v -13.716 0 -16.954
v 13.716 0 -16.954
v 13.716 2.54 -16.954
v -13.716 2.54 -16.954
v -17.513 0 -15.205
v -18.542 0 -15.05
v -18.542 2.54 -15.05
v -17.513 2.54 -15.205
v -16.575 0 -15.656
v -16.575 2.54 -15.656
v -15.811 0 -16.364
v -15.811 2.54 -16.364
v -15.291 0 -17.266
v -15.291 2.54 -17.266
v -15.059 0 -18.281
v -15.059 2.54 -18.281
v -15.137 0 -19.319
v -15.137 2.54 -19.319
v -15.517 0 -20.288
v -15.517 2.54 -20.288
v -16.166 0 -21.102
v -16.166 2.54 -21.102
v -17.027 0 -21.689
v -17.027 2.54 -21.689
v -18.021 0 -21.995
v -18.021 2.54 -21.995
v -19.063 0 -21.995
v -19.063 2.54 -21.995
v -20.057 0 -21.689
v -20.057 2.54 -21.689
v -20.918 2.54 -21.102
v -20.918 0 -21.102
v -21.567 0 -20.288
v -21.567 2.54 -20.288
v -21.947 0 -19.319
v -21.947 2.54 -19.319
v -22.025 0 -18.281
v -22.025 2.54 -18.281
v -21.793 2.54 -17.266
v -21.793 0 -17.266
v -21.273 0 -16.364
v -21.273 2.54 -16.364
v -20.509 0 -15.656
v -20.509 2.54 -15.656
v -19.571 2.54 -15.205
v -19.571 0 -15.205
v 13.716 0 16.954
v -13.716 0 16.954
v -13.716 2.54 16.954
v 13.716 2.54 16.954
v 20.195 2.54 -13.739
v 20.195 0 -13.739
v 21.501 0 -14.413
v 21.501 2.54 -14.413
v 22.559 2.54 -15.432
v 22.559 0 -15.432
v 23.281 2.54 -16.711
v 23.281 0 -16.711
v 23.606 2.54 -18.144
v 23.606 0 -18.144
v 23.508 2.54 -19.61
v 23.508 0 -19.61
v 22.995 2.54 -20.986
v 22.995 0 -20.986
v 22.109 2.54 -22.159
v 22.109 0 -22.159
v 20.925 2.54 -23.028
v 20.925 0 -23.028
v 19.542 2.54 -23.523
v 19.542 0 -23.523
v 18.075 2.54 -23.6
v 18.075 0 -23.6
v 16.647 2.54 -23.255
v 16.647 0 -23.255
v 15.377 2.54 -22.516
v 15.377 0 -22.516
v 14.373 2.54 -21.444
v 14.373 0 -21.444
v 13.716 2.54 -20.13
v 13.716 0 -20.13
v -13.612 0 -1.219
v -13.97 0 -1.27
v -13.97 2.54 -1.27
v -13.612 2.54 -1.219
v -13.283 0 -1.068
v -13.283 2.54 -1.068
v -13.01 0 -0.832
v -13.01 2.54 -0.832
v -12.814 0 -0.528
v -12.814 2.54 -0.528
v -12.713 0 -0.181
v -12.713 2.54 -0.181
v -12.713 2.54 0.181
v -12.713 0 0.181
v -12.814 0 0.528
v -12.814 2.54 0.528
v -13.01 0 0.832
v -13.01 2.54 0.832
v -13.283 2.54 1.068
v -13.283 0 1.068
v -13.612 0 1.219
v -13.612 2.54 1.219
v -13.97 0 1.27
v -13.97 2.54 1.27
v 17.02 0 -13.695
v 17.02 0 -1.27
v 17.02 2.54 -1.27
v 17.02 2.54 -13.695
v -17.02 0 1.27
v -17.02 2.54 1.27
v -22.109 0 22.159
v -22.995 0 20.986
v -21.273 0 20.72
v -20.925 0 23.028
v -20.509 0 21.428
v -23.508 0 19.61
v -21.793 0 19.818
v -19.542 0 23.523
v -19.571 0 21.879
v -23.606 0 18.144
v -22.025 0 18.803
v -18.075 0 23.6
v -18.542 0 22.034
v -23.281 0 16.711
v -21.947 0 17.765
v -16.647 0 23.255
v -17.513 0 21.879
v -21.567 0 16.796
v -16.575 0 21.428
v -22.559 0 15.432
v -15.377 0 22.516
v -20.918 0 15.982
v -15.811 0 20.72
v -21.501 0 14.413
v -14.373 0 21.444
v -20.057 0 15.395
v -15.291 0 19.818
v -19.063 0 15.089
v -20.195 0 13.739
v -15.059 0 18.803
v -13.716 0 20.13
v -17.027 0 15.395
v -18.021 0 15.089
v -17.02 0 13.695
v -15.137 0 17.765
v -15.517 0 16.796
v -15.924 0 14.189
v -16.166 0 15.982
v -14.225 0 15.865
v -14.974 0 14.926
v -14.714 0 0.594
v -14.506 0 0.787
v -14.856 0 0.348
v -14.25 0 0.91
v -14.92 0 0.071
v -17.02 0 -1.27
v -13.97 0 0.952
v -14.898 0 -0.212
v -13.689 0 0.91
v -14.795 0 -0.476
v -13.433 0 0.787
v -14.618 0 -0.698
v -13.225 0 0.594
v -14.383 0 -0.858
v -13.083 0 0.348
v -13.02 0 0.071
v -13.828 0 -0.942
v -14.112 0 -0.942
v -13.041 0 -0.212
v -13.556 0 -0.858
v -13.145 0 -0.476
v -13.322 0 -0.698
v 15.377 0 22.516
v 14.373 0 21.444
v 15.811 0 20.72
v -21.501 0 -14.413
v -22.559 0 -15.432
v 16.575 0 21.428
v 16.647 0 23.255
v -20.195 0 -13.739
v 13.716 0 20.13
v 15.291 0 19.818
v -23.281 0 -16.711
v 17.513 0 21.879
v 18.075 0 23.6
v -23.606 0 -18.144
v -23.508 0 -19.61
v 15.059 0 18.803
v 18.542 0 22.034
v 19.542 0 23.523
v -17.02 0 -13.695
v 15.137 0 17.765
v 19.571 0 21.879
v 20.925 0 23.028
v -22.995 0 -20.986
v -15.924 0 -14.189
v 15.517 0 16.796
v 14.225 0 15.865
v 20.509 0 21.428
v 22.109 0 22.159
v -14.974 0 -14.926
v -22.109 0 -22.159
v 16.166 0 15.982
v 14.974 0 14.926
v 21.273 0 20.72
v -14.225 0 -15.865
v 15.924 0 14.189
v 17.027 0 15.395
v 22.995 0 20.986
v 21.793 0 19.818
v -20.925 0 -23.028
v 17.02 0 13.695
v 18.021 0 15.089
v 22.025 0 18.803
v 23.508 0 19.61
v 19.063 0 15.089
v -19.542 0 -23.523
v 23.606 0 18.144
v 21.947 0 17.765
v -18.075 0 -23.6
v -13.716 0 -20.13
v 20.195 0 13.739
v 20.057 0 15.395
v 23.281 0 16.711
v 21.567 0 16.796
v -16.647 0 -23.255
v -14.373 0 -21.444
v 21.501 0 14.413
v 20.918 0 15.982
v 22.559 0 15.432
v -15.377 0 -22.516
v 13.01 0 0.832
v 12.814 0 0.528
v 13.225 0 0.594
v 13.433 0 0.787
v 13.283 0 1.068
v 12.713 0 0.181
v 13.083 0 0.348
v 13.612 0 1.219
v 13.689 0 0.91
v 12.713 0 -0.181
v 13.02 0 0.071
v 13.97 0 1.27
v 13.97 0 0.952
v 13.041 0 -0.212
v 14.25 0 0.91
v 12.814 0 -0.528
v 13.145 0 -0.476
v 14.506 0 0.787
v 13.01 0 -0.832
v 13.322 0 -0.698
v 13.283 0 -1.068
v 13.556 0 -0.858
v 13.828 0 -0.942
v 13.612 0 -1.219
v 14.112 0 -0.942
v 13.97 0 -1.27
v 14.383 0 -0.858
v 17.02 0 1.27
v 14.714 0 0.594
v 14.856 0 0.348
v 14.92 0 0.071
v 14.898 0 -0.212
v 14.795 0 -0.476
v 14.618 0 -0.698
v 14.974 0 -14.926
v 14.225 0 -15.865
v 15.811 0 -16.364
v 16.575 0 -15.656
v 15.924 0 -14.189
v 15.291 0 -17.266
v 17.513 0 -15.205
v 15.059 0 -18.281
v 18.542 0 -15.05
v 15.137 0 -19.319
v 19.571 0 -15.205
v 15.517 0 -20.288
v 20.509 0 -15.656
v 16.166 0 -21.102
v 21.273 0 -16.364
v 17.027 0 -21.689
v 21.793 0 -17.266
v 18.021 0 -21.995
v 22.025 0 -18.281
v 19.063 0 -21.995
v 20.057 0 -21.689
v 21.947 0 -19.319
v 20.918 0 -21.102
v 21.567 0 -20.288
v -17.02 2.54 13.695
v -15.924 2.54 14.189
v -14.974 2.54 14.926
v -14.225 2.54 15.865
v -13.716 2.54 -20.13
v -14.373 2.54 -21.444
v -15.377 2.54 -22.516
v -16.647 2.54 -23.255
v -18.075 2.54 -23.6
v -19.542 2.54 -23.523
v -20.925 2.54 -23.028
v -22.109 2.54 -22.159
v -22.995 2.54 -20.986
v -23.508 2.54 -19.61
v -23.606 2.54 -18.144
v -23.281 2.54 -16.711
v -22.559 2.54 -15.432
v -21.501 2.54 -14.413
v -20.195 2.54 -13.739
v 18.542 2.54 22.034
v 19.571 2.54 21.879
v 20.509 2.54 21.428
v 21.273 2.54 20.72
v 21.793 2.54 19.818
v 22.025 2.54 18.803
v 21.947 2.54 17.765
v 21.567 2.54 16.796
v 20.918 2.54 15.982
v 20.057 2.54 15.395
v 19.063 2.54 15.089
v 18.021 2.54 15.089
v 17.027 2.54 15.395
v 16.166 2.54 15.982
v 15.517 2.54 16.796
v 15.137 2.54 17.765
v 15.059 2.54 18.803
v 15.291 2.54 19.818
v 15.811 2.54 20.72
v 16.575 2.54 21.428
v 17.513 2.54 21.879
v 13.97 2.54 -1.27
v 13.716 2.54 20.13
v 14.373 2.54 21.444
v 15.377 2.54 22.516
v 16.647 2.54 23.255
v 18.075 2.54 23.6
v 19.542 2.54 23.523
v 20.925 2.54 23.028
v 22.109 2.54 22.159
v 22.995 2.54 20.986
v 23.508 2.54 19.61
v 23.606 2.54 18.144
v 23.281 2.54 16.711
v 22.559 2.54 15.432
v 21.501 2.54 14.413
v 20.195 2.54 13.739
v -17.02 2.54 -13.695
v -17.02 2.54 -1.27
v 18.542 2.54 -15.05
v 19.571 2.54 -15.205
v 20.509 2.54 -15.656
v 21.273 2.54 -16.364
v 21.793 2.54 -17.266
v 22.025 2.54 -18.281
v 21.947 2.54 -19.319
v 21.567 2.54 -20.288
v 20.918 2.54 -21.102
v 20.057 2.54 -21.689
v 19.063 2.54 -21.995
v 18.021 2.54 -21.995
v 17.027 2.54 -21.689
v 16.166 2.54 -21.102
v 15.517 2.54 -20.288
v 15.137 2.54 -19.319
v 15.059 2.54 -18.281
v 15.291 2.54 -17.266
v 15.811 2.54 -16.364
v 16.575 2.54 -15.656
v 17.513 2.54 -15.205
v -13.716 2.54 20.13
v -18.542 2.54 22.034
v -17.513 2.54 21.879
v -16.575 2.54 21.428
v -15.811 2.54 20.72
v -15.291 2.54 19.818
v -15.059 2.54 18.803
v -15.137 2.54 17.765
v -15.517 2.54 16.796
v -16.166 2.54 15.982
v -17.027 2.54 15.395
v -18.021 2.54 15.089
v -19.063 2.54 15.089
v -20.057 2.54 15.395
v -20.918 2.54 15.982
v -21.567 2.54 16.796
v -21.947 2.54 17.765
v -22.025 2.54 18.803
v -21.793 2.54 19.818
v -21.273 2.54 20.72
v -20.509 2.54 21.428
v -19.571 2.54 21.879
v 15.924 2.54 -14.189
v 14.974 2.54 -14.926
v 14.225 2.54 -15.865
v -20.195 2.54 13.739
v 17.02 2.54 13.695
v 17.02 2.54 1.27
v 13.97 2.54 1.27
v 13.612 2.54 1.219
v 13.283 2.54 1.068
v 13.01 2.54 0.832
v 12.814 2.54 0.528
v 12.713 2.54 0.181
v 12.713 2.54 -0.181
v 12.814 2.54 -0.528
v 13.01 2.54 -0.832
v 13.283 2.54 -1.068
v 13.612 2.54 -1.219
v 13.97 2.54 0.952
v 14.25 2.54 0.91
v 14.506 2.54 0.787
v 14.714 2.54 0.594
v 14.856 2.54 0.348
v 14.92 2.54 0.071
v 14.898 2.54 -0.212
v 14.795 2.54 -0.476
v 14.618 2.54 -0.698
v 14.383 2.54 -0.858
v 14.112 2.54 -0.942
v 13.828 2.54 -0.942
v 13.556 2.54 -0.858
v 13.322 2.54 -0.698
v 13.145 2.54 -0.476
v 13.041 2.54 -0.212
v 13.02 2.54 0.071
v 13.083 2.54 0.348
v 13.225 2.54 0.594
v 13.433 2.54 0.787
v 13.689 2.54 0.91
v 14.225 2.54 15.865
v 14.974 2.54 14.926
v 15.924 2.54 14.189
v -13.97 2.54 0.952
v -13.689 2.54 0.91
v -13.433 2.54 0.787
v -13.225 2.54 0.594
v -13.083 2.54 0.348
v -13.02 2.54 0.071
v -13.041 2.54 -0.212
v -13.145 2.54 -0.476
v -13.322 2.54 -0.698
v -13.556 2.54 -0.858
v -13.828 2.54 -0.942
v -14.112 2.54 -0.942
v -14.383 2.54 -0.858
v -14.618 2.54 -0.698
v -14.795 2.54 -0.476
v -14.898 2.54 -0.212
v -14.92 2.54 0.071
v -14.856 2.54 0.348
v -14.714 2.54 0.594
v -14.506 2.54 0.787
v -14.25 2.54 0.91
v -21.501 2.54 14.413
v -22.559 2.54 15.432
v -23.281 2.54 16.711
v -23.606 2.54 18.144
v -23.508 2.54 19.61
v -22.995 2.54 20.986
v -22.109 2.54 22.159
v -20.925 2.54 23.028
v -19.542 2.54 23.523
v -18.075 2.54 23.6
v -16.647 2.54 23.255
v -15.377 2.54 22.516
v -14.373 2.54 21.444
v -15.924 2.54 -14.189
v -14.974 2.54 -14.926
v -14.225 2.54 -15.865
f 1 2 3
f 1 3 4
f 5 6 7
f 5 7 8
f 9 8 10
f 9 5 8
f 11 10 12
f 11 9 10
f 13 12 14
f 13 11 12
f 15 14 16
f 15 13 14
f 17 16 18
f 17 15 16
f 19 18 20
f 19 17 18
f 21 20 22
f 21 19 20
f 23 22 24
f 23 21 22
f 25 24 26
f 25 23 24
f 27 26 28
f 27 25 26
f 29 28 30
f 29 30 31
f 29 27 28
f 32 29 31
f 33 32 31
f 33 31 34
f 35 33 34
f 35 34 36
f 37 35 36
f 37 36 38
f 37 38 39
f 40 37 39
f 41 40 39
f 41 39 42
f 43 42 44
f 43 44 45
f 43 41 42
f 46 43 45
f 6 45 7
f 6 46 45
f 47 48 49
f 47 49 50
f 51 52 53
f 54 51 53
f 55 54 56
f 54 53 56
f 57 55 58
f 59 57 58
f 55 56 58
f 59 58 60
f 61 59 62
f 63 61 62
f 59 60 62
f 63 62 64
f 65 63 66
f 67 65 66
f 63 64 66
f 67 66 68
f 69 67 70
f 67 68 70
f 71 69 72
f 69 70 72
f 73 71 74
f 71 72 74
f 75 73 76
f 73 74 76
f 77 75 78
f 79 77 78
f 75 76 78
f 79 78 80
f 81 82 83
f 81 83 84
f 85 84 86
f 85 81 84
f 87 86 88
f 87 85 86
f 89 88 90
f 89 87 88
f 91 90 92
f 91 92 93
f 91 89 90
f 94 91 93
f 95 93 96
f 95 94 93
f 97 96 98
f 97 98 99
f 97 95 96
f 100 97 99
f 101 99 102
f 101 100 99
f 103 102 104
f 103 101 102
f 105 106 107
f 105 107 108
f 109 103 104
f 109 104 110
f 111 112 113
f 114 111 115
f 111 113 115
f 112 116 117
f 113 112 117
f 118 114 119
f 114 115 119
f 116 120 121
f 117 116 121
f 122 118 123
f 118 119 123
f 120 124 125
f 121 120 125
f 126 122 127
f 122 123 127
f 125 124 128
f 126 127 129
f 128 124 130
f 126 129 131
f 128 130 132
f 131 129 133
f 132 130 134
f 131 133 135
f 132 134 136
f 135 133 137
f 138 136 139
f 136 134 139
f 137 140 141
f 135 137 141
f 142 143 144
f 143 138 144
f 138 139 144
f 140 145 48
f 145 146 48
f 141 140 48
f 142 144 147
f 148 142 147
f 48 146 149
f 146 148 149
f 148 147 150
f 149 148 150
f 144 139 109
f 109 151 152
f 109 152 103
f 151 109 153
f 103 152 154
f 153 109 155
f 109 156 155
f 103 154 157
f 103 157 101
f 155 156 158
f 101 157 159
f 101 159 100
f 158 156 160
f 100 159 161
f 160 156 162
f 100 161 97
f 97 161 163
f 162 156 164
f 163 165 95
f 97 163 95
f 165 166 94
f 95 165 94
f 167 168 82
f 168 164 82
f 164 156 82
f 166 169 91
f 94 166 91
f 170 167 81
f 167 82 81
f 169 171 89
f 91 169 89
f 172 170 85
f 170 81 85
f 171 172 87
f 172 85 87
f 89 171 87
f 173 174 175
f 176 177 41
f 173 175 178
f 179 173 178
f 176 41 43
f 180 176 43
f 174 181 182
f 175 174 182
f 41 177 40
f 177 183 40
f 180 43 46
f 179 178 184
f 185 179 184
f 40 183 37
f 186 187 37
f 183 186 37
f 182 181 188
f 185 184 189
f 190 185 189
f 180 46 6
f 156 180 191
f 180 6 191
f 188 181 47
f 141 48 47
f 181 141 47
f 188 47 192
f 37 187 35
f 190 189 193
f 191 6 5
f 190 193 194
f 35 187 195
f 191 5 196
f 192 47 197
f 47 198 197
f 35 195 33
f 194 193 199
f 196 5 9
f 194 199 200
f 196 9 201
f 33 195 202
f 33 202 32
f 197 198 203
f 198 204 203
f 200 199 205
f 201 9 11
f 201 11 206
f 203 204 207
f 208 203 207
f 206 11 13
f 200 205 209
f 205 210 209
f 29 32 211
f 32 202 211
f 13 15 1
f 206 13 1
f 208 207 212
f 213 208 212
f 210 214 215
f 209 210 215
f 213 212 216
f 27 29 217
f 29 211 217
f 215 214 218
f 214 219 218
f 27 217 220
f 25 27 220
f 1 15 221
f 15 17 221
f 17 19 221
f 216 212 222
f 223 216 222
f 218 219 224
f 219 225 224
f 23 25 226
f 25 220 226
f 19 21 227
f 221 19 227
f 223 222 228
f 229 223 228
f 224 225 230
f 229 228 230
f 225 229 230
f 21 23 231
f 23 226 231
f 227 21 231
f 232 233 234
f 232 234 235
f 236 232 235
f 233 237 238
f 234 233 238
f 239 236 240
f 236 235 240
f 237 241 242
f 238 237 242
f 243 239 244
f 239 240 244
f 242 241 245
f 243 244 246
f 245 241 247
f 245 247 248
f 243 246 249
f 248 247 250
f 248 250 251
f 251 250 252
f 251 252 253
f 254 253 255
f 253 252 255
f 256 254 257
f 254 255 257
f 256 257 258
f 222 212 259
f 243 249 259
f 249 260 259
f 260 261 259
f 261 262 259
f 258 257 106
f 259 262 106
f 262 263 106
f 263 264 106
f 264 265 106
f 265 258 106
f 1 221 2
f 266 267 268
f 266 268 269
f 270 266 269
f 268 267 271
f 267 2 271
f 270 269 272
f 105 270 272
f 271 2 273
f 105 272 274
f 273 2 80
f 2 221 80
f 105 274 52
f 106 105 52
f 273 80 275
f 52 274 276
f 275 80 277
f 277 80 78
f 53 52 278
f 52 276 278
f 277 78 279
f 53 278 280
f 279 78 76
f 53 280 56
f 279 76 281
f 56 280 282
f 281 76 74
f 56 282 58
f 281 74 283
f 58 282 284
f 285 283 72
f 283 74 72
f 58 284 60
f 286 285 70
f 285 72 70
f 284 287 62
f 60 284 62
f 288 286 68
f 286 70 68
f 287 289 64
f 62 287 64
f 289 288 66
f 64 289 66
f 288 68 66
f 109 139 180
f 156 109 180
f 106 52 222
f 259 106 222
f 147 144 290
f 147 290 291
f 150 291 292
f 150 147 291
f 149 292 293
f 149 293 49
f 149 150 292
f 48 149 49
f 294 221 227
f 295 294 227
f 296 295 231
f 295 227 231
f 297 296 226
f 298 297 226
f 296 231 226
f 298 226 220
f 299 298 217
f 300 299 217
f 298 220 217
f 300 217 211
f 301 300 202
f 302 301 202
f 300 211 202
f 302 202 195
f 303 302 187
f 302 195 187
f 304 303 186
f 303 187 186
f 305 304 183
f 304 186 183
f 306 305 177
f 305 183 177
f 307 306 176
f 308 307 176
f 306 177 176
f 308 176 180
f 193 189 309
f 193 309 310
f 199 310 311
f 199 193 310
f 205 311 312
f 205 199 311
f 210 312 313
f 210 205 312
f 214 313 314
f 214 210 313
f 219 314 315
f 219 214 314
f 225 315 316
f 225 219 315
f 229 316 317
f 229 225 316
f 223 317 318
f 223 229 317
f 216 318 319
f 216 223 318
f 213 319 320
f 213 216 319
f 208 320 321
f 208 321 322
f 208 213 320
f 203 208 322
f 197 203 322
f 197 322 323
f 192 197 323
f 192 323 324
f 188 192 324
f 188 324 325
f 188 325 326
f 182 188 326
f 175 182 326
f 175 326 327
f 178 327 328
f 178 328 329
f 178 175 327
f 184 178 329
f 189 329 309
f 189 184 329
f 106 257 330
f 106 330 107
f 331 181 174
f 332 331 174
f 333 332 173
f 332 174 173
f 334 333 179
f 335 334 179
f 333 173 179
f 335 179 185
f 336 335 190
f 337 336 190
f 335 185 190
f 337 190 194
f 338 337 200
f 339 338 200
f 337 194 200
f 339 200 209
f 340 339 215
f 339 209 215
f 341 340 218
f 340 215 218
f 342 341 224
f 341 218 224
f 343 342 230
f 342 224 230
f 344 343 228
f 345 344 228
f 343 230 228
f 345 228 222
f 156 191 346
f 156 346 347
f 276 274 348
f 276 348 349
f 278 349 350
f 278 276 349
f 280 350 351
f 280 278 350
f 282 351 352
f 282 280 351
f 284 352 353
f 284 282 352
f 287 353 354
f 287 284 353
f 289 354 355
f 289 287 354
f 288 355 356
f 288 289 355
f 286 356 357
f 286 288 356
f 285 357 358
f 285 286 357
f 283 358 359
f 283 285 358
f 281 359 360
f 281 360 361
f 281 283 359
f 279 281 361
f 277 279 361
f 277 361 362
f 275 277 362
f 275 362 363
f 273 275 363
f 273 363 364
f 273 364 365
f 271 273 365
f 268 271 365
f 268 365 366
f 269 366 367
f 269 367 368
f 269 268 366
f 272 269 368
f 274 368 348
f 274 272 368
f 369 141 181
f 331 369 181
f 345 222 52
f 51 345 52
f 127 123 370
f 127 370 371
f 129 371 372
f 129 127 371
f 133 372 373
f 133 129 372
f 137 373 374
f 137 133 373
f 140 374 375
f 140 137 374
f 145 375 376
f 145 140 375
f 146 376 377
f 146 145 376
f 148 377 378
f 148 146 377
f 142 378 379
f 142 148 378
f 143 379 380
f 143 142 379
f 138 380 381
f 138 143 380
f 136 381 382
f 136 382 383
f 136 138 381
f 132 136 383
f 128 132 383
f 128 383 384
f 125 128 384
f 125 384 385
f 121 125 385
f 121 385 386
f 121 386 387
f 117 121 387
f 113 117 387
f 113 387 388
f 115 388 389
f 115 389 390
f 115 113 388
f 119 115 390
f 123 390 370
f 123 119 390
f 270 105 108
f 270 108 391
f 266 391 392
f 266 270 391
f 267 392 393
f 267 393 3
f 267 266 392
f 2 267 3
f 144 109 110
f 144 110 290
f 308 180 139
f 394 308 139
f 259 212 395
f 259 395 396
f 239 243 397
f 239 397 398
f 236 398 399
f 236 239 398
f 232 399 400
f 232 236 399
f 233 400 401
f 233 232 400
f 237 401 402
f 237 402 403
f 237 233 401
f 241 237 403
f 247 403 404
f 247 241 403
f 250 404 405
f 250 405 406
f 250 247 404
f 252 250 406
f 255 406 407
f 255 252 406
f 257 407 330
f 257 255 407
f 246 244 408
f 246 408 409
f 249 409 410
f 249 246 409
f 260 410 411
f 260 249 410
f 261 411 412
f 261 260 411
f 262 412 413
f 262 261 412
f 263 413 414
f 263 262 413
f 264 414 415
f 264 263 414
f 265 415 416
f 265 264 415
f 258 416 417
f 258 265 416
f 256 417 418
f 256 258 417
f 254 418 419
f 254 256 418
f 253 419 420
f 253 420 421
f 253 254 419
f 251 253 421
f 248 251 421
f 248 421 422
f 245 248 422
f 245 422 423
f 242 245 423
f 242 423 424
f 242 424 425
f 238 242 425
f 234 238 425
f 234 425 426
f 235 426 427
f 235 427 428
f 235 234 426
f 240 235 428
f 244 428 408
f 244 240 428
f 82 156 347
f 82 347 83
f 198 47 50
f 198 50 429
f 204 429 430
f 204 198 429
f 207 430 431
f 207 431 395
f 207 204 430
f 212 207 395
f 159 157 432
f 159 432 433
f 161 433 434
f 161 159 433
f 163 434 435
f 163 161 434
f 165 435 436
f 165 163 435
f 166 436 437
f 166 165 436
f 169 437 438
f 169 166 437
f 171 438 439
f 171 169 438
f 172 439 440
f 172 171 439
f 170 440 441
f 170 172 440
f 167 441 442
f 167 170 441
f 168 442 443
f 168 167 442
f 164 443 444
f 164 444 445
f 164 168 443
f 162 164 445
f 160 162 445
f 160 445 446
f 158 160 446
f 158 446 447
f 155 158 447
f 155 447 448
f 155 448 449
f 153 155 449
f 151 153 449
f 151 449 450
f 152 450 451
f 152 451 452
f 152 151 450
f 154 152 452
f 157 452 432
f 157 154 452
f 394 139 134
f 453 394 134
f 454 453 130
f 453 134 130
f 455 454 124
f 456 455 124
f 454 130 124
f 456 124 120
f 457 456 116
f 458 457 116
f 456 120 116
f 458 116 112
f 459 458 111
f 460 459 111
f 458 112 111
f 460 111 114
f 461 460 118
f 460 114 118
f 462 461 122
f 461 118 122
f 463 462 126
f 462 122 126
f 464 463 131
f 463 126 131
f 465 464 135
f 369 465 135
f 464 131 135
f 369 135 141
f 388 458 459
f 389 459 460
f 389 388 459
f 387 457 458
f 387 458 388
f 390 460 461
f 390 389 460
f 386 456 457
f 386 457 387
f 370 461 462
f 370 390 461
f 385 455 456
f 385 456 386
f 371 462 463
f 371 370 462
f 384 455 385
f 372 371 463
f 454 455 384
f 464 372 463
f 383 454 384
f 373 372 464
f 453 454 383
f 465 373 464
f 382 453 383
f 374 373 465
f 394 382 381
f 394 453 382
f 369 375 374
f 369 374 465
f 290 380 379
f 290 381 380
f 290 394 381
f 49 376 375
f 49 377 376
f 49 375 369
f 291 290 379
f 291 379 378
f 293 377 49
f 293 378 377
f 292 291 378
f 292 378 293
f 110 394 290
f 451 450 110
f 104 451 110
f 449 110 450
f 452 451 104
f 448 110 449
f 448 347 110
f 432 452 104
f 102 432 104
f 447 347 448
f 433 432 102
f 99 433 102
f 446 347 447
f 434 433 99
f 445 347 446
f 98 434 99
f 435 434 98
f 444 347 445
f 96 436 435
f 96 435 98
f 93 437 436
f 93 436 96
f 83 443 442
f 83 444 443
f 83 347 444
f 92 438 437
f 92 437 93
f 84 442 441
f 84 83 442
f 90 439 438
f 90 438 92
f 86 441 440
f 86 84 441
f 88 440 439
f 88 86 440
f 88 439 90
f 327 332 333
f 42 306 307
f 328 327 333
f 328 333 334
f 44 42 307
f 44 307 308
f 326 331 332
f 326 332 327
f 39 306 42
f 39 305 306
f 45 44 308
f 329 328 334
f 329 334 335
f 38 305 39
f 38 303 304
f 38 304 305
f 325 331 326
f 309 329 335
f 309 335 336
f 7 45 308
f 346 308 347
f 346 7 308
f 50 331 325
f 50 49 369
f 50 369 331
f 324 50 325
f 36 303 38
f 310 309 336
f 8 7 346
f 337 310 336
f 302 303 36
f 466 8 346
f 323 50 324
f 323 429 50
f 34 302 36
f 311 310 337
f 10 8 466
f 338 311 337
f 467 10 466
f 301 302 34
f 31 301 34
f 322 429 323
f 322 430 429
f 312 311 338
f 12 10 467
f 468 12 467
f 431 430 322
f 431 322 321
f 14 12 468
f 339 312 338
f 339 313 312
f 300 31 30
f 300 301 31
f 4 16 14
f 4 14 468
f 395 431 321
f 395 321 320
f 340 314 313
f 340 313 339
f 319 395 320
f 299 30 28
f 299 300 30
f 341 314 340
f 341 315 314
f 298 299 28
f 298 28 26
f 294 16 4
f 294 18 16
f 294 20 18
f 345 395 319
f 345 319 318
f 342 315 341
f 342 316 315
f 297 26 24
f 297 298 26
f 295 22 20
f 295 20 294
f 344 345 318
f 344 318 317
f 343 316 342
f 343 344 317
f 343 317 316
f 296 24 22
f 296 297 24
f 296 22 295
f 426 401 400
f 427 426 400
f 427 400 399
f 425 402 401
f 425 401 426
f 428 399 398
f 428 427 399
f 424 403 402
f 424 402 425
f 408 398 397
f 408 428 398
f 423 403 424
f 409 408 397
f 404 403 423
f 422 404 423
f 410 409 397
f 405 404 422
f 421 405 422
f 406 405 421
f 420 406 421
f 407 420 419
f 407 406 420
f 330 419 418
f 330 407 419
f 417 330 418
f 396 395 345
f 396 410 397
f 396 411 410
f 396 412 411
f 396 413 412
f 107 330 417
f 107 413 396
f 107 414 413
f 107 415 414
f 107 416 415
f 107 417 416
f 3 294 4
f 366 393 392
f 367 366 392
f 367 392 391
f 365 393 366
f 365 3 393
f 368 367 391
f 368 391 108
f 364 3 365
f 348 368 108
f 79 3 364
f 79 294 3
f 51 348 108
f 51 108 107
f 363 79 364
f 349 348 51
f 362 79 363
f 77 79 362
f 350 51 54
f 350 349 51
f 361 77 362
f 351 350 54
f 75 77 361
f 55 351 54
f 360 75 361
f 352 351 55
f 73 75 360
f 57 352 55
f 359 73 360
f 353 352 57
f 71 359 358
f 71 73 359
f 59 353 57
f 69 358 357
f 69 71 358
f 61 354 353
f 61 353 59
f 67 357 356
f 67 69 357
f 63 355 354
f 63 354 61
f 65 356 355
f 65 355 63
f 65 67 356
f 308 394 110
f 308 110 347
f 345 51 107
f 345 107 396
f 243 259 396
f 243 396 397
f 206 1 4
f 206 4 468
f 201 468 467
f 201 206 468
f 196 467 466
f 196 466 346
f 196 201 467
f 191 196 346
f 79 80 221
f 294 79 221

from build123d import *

# Parameters (mm, degrees)
SKETCH1_R           = 3.4925
SKETCH1_R_2         = 0.9525
BOSS_EXTRUDE1_DEPTH = 2.54


with BuildPart() as part:
    # Sketch1 → Boss-Extrude1 (new body)
    with BuildSketch(Plane(origin=(0, 0, 0), x_dir=(1, 0, 0), z_dir=(0, 1, 0))):
        with BuildLine():
            Line((-20.195257301, 13.738549126), (-20.195257301, -13.738549126))
            ThreePointArc((-20.195257301, -13.738549126), (-22.109488558, -22.158548823), (-13.716417781, -20.1295))
            Line((-13.716417781, -20.1295), (13.716417781, -20.1295))
            ThreePointArc((13.716417781, -20.1295), (22.109488558, -22.158548823), (20.195257301, -13.738549126))
            Line((20.195257301, -13.738549126), (20.195257301, 13.738549126))
            ThreePointArc((20.195257301, 13.738549126), (22.109488558, 22.158548823), (13.716417781, 20.1295))
            Line((13.716417781, 20.1295), (-13.716417781, 20.1295))
            ThreePointArc((-13.716417781, 20.1295), (-22.109488558, 22.158548823), (-20.195257301, 13.738549126))
        make_face()
        with Locations(Location((18.542, -18.542, 0), (0, 0, 270))):
            Circle(SKETCH1_R, mode=Mode.SUBTRACT)
        with Locations(Location((-18.542, -18.542, 0), (0, 0, 270))):
            Circle(SKETCH1_R, mode=Mode.SUBTRACT)
        with Locations(Location((-18.542, 18.542, 0), (0, 0, 270))):
            Circle(SKETCH1_R, mode=Mode.SUBTRACT)
        with Locations(Location((18.542, 18.542, 0), (0, 0, 270))):
            Circle(SKETCH1_R, mode=Mode.SUBTRACT)
        with Locations(Location((-13.969691774, 0, 0), (0, 0, 270))):
            Circle(SKETCH1_R_2, mode=Mode.SUBTRACT)
        with Locations(Location((13.969691774, 0, 0), (0, 0, 270))):
            Circle(SKETCH1_R_2, mode=Mode.SUBTRACT)
        with BuildLine():
            Line((-17.020257301, 13.695279546), (-17.020257301, 1.27))
            Line((-17.020257301, 1.27), (-13.969691774, 1.27))
            ThreePointArc((-13.969691774, 1.27), (-12.699691774, 0), (-13.969691774, -1.27))
            Line((-13.969691774, -1.27), (-17.020257301, -1.27))
            Line((-17.020257301, -1.27), (-17.020257301, -13.695279546))
            ThreePointArc((-17.020257301, -13.695279546), (-14.974400962, -14.925560161), (-13.716417781, -16.9545))
            Line((-13.716417781, -16.9545), (13.716417781, -16.9545))
            ThreePointArc((13.716417781, -16.9545), (14.974400962, -14.925560161), (17.020257301, -13.695279546))
            Line((17.020257301, -13.695279546), (17.020257301, -1.27))
            Line((17.020257301, -1.27), (13.969691774, -1.27))
            ThreePointArc((13.969691774, -1.27), (12.699691774, 0), (13.969691774, 1.27))
            Line((13.969691774, 1.27), (17.020257301, 1.27))
            Line((17.020257301, 1.27), (17.020257301, 13.695279546))
            ThreePointArc((17.020257301, 13.695279546), (14.974400962, 14.925560161), (13.716417781, 16.9545))
            Line((13.716417781, 16.9545), (-13.716417781, 16.9545))
            ThreePointArc((-13.716417781, 16.9545), (-14.974400962, 14.925560161), (-17.020257301, 13.695279546))
        make_face(mode=Mode.SUBTRACT)
    extrude(amount=BOSS_EXTRUDE1_DEPTH)


solid = part.part
